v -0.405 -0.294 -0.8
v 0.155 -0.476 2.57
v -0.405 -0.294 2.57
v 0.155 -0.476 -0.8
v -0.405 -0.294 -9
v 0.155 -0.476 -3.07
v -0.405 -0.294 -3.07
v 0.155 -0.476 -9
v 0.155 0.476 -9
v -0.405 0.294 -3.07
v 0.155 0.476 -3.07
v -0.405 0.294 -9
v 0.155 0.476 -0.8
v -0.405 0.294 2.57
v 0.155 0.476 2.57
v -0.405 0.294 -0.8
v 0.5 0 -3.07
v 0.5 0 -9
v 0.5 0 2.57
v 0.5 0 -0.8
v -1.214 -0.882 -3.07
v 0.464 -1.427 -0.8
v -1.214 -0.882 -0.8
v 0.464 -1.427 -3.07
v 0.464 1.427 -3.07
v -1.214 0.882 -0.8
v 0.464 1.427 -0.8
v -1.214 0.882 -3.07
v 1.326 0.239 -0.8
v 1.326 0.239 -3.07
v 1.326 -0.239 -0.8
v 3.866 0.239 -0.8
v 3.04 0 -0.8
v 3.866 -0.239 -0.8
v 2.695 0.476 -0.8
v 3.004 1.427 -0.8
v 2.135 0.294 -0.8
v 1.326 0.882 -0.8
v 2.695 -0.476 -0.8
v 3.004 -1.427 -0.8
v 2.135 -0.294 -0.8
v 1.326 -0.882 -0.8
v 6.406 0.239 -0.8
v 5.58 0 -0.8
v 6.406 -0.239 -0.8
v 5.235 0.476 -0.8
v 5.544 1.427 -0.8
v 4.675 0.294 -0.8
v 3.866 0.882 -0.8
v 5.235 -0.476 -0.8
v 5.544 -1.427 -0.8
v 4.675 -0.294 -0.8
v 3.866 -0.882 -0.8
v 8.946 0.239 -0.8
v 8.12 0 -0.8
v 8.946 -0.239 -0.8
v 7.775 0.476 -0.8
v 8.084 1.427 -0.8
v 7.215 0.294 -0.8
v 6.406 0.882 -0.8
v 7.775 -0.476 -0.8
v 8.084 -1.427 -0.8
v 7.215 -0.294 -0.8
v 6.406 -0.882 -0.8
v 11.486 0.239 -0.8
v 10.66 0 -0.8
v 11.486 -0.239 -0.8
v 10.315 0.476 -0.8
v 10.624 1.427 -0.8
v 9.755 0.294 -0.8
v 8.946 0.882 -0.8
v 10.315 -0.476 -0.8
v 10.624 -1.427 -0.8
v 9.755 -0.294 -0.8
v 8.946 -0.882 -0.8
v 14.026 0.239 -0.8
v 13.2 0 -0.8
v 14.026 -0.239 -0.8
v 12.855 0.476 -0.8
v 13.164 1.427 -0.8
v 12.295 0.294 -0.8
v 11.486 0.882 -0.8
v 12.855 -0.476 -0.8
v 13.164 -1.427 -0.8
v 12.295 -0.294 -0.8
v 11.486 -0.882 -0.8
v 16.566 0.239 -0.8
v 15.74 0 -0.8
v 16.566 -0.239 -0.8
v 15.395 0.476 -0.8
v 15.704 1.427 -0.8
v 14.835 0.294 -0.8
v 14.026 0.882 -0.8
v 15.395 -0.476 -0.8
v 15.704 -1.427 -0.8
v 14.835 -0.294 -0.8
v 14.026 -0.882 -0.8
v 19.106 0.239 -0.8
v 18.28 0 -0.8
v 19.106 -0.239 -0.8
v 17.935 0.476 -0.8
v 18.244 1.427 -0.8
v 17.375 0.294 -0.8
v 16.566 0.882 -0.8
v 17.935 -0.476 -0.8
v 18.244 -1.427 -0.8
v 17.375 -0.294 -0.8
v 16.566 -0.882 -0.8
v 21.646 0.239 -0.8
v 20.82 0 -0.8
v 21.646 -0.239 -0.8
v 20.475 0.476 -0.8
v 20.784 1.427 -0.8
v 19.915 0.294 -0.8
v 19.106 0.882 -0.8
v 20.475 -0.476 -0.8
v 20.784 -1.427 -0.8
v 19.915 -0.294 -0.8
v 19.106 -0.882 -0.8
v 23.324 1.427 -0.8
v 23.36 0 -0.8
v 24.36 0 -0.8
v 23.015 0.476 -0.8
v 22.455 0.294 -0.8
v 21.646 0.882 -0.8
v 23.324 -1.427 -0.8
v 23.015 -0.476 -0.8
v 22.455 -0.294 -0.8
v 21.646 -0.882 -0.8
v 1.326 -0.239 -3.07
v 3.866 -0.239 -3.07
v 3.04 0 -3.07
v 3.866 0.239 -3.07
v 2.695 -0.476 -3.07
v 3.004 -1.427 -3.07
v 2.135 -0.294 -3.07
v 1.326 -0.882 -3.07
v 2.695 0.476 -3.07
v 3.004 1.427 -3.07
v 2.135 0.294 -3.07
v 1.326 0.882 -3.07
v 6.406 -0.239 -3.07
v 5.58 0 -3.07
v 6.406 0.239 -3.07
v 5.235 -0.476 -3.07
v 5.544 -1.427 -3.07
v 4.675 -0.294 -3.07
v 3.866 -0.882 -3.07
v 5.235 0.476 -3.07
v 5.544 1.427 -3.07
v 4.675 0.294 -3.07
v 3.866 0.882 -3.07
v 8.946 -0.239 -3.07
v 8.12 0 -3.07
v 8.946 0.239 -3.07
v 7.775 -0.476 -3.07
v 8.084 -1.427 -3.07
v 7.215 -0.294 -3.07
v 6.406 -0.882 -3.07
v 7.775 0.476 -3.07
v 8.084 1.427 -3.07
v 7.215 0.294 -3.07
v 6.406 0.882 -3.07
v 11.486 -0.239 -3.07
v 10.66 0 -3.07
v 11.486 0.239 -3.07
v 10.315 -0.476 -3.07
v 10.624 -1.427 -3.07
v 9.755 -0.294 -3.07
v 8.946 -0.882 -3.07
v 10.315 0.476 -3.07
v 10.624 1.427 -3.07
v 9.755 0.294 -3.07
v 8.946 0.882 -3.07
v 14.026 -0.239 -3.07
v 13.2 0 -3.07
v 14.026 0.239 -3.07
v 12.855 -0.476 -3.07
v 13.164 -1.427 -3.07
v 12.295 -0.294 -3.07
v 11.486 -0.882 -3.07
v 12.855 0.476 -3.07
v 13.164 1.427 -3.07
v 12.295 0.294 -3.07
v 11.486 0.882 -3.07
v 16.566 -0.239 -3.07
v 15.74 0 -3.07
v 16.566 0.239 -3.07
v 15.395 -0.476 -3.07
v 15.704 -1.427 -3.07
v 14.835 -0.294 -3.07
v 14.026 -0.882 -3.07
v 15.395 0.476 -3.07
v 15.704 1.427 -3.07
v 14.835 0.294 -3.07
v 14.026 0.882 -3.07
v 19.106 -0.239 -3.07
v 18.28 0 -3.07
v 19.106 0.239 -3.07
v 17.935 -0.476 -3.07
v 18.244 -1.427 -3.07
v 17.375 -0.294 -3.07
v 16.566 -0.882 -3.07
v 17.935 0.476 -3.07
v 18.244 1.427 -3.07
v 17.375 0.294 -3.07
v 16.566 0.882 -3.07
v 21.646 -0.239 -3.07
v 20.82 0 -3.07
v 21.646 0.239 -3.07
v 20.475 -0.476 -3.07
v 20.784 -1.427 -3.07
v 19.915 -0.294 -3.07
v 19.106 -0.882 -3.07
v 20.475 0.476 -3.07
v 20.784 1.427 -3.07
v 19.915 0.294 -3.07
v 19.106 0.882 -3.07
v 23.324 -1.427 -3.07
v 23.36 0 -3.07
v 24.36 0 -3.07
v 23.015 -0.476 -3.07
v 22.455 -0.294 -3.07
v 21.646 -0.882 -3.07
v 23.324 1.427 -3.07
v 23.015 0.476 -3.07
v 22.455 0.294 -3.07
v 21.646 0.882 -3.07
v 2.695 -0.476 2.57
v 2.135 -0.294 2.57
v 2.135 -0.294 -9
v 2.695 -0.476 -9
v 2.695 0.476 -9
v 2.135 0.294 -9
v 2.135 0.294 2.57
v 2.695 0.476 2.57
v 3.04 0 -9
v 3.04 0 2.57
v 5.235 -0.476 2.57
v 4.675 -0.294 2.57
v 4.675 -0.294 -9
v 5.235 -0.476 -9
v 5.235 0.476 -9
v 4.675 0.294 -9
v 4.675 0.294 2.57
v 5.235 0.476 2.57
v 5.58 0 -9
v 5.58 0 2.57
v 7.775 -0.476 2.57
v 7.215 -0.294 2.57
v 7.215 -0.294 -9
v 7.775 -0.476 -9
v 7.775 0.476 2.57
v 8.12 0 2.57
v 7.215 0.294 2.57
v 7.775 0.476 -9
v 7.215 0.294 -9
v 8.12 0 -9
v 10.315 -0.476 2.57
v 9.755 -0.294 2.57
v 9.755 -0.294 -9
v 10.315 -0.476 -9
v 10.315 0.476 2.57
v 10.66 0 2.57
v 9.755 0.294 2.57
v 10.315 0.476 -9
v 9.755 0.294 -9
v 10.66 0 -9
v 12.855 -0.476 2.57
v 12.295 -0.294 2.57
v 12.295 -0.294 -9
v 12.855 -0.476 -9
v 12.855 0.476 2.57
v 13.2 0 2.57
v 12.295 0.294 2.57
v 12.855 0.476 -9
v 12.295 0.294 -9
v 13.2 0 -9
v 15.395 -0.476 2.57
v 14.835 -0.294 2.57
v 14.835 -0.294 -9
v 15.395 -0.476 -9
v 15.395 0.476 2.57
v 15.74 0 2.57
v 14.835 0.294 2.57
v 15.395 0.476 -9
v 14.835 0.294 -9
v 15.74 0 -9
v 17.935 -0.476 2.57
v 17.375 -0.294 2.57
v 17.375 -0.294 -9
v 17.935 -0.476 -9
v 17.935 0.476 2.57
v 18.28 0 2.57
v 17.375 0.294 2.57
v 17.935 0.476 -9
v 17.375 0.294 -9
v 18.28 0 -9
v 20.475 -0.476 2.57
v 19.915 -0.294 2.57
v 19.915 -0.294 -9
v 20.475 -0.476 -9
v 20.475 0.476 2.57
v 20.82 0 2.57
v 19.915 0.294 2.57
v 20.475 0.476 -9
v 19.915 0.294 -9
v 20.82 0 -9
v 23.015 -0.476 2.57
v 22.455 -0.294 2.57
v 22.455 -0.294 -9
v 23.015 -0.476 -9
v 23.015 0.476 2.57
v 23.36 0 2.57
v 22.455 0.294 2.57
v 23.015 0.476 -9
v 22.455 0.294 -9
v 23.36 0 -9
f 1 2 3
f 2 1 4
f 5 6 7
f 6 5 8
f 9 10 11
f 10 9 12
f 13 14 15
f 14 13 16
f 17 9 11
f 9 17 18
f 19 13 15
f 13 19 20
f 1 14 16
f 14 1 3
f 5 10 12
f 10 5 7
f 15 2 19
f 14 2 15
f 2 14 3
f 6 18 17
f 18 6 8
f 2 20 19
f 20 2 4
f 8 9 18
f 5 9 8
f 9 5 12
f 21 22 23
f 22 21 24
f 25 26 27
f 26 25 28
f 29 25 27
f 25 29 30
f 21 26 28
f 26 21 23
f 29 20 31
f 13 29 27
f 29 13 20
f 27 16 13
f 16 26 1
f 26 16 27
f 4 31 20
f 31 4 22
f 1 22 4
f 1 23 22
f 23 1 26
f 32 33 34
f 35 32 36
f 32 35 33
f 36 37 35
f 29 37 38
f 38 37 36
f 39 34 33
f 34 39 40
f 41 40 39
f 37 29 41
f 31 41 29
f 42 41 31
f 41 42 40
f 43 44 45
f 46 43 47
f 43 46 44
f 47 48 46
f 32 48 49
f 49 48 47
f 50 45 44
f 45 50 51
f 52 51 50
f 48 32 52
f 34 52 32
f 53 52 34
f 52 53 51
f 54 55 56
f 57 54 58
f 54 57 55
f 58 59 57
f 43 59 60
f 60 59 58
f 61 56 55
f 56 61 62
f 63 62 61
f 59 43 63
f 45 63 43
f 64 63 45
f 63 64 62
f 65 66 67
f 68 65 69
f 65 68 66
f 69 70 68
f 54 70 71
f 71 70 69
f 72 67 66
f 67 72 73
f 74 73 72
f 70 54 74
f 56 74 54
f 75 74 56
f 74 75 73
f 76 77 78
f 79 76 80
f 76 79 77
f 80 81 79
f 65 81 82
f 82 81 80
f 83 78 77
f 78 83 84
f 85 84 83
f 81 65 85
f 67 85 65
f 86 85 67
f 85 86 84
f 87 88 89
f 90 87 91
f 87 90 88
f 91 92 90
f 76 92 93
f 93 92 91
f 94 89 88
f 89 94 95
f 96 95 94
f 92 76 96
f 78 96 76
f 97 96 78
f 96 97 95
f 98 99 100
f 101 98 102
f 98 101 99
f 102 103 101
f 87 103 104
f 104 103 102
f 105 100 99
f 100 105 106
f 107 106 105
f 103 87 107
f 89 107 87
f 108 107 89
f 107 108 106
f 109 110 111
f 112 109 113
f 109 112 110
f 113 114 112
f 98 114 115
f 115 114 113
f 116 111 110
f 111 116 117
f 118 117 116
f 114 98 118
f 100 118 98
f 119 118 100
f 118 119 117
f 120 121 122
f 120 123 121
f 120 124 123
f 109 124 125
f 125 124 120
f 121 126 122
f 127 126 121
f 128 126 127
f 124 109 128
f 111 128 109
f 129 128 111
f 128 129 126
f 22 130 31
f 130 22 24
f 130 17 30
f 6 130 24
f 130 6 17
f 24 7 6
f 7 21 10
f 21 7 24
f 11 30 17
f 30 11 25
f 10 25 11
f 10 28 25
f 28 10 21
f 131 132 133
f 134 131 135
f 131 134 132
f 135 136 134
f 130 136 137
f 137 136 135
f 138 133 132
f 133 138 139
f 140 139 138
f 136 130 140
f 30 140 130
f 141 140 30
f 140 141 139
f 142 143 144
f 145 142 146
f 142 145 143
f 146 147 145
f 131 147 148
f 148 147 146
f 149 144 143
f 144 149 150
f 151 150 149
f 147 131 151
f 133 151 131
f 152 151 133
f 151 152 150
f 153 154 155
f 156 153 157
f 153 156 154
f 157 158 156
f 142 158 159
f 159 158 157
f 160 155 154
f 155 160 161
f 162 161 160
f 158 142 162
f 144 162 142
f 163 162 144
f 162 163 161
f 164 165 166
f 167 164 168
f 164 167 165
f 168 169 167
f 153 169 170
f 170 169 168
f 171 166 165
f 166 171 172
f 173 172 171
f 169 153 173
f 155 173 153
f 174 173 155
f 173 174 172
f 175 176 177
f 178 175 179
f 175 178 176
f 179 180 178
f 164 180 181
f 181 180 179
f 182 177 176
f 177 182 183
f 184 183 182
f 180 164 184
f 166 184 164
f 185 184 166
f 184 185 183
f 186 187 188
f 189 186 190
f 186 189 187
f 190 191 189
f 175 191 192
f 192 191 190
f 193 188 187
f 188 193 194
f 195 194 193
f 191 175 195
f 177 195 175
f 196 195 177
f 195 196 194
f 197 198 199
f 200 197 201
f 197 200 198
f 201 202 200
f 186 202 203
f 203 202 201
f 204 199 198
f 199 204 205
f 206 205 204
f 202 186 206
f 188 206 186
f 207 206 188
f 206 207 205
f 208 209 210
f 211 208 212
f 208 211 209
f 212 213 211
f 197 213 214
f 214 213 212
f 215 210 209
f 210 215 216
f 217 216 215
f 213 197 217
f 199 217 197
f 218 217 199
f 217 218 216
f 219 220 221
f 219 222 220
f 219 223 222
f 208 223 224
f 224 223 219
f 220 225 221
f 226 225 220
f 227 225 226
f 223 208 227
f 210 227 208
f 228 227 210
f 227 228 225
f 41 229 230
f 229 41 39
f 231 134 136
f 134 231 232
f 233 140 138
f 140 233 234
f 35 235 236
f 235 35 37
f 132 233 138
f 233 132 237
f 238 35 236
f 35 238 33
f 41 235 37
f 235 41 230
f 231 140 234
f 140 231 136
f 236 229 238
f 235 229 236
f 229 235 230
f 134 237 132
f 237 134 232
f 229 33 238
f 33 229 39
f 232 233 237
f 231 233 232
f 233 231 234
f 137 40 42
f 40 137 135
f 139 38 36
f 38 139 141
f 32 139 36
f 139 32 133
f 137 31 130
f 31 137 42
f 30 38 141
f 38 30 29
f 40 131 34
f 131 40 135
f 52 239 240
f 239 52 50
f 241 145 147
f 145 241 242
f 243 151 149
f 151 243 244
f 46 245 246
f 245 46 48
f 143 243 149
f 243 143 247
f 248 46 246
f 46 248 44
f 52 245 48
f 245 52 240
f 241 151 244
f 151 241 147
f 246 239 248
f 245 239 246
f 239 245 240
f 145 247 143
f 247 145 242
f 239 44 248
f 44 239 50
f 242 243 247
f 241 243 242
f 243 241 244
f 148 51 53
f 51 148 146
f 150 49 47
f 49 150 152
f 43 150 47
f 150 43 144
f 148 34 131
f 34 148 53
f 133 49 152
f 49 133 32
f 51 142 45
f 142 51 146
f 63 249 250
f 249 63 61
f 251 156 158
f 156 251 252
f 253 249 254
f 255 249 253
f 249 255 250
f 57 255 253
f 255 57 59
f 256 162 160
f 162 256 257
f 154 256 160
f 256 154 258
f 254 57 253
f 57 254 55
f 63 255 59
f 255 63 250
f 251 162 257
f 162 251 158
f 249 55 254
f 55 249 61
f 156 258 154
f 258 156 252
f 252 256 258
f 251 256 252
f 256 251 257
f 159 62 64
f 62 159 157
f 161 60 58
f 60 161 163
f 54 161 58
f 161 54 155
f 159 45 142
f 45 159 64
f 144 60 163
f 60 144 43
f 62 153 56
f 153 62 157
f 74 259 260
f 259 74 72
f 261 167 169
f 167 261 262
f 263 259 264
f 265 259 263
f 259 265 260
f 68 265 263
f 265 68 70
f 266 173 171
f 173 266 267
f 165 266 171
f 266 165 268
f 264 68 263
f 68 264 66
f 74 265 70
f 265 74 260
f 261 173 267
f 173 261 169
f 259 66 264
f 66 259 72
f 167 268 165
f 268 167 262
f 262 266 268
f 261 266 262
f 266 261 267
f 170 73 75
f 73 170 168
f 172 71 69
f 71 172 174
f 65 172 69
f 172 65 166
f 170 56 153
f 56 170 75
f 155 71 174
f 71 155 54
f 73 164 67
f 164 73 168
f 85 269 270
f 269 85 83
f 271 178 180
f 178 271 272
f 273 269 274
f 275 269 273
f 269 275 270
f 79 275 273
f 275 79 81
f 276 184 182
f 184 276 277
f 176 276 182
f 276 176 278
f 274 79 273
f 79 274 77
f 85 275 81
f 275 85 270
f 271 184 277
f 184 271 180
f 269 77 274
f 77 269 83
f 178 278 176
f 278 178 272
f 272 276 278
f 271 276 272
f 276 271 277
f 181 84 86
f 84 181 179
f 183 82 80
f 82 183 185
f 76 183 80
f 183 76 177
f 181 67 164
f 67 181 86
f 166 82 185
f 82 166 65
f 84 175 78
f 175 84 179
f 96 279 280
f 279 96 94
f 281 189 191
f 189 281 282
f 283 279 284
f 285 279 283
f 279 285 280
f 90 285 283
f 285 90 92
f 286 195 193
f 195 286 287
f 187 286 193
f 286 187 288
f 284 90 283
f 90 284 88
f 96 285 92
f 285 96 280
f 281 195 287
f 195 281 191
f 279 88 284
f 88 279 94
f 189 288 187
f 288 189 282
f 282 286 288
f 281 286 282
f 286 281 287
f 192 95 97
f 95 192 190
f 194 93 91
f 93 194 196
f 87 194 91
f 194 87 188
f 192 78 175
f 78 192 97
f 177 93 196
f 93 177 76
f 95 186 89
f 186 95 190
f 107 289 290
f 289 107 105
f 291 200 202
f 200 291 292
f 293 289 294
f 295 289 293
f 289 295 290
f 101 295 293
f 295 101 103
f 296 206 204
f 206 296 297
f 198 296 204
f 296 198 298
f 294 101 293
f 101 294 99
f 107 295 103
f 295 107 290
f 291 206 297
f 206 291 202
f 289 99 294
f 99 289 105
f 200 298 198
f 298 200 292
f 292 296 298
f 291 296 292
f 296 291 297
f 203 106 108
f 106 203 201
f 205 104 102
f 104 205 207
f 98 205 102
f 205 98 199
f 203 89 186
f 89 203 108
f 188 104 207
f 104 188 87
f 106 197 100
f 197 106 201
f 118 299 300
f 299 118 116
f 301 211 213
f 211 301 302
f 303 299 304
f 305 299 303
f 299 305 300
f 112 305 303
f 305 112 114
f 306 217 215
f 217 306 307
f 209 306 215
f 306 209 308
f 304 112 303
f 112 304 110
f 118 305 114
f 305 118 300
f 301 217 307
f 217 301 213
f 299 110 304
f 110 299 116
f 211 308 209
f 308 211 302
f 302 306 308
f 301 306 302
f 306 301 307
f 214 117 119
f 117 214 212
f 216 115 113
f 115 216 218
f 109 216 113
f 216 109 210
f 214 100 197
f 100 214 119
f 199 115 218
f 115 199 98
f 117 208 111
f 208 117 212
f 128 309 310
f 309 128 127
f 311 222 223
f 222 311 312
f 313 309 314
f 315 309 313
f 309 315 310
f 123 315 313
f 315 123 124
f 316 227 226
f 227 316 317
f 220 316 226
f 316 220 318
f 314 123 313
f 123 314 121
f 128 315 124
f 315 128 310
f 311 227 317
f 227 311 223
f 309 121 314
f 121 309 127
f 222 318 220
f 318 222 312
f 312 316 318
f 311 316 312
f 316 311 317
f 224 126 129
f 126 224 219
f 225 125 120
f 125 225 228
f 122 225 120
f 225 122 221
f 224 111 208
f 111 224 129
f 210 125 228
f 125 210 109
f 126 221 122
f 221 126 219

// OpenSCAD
//
// A pin header with 0.1 inch spacing
//
pitch = 2.54;

module bbs_header(pins)
{
    for (i = [1 : pins])
    {
        translate([(i-1)*pitch, 0, -9]) cylinder(h=11.57, r=0.5);
        translate([(i-1)*pitch, 0, -9 + 5.93]) cylinder(h=2.27, r=1.5);
    }
}

bbs_header(10);
